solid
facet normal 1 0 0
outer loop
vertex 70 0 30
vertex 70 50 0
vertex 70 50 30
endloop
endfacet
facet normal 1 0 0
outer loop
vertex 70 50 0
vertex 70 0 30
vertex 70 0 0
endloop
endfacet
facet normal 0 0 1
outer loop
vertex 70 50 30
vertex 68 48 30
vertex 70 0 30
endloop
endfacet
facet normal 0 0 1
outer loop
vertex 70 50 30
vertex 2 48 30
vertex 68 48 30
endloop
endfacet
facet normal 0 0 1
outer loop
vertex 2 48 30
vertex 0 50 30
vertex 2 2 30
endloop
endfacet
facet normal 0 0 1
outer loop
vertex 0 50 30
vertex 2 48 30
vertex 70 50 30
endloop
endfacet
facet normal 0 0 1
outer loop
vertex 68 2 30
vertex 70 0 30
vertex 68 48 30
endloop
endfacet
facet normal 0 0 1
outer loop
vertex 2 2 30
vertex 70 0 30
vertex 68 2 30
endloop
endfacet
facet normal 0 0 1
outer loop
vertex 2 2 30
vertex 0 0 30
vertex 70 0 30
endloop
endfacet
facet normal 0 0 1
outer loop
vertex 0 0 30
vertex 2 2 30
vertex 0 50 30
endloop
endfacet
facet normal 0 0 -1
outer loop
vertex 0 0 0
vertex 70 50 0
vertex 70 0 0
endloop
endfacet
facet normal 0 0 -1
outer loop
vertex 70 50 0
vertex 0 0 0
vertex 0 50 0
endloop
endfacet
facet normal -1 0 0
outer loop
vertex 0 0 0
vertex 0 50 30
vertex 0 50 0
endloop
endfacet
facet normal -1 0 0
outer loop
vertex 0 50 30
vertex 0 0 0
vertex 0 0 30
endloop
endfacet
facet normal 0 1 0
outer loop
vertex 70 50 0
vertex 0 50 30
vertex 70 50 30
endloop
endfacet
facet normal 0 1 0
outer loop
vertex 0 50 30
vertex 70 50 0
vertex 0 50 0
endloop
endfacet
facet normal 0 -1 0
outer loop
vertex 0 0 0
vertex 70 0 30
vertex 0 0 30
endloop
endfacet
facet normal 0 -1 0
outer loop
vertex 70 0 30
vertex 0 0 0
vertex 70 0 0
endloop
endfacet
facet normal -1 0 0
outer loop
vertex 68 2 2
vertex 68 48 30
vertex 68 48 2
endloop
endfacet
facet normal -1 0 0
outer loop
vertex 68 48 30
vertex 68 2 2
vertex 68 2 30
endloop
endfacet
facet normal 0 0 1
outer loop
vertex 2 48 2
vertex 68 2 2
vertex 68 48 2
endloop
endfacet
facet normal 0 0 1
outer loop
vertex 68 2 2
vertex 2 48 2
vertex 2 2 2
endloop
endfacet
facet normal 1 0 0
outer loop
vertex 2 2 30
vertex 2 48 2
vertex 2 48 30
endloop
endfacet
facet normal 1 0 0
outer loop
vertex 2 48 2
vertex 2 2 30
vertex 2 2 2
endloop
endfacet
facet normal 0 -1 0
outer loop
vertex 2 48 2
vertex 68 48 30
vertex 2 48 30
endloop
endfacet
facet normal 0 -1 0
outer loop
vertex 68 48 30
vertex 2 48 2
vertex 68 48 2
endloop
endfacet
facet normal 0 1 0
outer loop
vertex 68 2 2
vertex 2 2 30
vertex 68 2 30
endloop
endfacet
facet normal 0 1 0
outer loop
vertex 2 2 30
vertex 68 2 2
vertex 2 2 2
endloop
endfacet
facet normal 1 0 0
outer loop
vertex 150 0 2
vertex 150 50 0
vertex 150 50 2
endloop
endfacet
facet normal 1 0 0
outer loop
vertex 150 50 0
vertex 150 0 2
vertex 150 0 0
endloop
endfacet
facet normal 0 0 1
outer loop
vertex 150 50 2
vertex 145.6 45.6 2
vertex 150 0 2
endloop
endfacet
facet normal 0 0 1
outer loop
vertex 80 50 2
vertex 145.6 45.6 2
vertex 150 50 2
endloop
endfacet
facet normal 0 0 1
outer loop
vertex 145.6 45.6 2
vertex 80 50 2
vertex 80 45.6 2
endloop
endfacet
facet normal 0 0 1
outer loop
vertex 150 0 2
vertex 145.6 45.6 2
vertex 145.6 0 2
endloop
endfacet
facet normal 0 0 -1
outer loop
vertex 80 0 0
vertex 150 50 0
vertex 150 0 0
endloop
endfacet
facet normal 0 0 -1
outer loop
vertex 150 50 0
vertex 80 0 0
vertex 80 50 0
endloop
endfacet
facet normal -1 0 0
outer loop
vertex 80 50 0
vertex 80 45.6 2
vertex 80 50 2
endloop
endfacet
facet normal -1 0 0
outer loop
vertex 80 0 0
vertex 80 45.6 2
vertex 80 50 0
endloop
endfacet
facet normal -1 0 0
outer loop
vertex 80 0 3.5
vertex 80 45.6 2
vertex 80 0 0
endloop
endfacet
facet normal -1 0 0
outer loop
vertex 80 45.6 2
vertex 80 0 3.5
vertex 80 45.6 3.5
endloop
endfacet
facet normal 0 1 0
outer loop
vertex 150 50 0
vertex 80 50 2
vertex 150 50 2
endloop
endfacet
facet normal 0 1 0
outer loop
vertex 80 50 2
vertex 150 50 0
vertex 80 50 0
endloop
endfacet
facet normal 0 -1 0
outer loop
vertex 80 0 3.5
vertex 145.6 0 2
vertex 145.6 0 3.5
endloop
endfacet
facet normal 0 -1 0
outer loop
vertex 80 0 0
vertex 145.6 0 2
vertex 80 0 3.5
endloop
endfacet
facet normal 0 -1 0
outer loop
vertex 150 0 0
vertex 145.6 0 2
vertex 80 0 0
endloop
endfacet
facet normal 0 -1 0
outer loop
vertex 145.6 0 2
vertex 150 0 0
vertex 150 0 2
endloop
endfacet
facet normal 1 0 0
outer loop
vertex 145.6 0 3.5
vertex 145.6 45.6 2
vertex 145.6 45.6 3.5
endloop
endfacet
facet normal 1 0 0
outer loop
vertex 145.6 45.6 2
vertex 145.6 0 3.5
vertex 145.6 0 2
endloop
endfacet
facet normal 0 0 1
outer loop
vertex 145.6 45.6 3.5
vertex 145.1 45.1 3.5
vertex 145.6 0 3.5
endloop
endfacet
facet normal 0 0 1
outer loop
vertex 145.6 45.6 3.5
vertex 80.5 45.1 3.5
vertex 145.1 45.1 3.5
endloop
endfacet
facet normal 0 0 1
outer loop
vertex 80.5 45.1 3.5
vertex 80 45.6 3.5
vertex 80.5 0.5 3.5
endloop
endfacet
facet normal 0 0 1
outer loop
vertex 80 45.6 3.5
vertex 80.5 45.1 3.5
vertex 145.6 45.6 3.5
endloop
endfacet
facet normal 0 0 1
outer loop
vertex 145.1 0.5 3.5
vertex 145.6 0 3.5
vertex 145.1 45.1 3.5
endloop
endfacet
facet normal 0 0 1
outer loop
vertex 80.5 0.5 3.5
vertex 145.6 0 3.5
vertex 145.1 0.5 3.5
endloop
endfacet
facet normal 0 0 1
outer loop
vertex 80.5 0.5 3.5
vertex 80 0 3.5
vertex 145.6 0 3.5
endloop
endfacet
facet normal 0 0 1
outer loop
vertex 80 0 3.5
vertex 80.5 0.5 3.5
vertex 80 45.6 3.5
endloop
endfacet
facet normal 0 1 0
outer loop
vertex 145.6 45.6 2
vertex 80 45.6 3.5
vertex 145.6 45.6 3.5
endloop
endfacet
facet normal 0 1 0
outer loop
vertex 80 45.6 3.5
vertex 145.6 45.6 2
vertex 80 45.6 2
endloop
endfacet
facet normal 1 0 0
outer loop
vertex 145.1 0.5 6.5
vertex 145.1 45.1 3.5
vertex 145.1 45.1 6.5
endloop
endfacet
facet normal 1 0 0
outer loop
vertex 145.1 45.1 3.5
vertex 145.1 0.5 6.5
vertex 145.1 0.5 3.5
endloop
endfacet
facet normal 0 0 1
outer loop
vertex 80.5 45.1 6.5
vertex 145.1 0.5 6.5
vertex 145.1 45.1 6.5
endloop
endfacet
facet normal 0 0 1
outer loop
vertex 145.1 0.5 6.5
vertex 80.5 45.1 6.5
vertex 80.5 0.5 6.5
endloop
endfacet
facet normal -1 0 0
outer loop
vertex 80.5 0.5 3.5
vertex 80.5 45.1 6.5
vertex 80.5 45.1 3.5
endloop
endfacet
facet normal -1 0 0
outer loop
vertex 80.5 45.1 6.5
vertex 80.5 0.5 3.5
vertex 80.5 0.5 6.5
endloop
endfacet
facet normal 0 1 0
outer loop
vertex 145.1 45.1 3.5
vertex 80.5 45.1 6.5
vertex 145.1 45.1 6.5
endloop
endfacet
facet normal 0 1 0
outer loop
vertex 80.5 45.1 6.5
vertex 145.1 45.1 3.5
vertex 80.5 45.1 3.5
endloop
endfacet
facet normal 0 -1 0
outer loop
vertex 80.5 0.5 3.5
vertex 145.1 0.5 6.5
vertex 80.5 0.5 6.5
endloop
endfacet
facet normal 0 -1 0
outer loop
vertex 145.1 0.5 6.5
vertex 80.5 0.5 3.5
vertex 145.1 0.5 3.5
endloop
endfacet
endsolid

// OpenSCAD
// Two-part enclosure for small electronics board
// Print orientation: box on bed (z = 0), lid on +X side, both build upward

$fn = 64;

// ---- Dimensions (mm) ----
box_x      = 70;    // box outer length (X)
box_y      = 50;    // box outer width (Y)
box_z      = 30;    // box outer height (Z)
wall       = 2;     // box wall thickness
floor      = 2;     // box floor thickness
gap        = 10;    // gap between box and lid

lip_x      = 65.6;  // lip outer length (X)
lip_y      = 45.6;  // lip outer width (Y)
lip_t      = 1.5;   // lip wall thickness
lip_h      = 4;     // lip height above plate

plate_x    = 70;    // plate length (X)
plate_y    = 50;    // plate width (Y)
plate_t    = 2;     // plate thickness

eps        = 0.5;   // cutter overshoot

// ---- Model ----
union() {
    // Box
    difference() {
        cube([box_x, box_y, box_z]);
        translate([wall, wall, floor]) cube([box_x - 2 * wall, box_y - 2 * wall, box_z - floor]); // hollow body
    }

    // Lid: plate with lip, printed upside down
    union() {
        translate([box_x + gap, 0, 0]) {
            // plate
            cube([plate_x, plate_y, plate_t]);
            // lip
            translate([0, 0, plate_t]) cube([lip_x, lip_y, lip_t]);
        }
        // cutter for lip cavity
        translate([box_x + gap + eps, eps, plate_t])
            cube([lip_x - 2 * eps, lip_y - 2 * eps, lip_h + eps]);
    }
}
